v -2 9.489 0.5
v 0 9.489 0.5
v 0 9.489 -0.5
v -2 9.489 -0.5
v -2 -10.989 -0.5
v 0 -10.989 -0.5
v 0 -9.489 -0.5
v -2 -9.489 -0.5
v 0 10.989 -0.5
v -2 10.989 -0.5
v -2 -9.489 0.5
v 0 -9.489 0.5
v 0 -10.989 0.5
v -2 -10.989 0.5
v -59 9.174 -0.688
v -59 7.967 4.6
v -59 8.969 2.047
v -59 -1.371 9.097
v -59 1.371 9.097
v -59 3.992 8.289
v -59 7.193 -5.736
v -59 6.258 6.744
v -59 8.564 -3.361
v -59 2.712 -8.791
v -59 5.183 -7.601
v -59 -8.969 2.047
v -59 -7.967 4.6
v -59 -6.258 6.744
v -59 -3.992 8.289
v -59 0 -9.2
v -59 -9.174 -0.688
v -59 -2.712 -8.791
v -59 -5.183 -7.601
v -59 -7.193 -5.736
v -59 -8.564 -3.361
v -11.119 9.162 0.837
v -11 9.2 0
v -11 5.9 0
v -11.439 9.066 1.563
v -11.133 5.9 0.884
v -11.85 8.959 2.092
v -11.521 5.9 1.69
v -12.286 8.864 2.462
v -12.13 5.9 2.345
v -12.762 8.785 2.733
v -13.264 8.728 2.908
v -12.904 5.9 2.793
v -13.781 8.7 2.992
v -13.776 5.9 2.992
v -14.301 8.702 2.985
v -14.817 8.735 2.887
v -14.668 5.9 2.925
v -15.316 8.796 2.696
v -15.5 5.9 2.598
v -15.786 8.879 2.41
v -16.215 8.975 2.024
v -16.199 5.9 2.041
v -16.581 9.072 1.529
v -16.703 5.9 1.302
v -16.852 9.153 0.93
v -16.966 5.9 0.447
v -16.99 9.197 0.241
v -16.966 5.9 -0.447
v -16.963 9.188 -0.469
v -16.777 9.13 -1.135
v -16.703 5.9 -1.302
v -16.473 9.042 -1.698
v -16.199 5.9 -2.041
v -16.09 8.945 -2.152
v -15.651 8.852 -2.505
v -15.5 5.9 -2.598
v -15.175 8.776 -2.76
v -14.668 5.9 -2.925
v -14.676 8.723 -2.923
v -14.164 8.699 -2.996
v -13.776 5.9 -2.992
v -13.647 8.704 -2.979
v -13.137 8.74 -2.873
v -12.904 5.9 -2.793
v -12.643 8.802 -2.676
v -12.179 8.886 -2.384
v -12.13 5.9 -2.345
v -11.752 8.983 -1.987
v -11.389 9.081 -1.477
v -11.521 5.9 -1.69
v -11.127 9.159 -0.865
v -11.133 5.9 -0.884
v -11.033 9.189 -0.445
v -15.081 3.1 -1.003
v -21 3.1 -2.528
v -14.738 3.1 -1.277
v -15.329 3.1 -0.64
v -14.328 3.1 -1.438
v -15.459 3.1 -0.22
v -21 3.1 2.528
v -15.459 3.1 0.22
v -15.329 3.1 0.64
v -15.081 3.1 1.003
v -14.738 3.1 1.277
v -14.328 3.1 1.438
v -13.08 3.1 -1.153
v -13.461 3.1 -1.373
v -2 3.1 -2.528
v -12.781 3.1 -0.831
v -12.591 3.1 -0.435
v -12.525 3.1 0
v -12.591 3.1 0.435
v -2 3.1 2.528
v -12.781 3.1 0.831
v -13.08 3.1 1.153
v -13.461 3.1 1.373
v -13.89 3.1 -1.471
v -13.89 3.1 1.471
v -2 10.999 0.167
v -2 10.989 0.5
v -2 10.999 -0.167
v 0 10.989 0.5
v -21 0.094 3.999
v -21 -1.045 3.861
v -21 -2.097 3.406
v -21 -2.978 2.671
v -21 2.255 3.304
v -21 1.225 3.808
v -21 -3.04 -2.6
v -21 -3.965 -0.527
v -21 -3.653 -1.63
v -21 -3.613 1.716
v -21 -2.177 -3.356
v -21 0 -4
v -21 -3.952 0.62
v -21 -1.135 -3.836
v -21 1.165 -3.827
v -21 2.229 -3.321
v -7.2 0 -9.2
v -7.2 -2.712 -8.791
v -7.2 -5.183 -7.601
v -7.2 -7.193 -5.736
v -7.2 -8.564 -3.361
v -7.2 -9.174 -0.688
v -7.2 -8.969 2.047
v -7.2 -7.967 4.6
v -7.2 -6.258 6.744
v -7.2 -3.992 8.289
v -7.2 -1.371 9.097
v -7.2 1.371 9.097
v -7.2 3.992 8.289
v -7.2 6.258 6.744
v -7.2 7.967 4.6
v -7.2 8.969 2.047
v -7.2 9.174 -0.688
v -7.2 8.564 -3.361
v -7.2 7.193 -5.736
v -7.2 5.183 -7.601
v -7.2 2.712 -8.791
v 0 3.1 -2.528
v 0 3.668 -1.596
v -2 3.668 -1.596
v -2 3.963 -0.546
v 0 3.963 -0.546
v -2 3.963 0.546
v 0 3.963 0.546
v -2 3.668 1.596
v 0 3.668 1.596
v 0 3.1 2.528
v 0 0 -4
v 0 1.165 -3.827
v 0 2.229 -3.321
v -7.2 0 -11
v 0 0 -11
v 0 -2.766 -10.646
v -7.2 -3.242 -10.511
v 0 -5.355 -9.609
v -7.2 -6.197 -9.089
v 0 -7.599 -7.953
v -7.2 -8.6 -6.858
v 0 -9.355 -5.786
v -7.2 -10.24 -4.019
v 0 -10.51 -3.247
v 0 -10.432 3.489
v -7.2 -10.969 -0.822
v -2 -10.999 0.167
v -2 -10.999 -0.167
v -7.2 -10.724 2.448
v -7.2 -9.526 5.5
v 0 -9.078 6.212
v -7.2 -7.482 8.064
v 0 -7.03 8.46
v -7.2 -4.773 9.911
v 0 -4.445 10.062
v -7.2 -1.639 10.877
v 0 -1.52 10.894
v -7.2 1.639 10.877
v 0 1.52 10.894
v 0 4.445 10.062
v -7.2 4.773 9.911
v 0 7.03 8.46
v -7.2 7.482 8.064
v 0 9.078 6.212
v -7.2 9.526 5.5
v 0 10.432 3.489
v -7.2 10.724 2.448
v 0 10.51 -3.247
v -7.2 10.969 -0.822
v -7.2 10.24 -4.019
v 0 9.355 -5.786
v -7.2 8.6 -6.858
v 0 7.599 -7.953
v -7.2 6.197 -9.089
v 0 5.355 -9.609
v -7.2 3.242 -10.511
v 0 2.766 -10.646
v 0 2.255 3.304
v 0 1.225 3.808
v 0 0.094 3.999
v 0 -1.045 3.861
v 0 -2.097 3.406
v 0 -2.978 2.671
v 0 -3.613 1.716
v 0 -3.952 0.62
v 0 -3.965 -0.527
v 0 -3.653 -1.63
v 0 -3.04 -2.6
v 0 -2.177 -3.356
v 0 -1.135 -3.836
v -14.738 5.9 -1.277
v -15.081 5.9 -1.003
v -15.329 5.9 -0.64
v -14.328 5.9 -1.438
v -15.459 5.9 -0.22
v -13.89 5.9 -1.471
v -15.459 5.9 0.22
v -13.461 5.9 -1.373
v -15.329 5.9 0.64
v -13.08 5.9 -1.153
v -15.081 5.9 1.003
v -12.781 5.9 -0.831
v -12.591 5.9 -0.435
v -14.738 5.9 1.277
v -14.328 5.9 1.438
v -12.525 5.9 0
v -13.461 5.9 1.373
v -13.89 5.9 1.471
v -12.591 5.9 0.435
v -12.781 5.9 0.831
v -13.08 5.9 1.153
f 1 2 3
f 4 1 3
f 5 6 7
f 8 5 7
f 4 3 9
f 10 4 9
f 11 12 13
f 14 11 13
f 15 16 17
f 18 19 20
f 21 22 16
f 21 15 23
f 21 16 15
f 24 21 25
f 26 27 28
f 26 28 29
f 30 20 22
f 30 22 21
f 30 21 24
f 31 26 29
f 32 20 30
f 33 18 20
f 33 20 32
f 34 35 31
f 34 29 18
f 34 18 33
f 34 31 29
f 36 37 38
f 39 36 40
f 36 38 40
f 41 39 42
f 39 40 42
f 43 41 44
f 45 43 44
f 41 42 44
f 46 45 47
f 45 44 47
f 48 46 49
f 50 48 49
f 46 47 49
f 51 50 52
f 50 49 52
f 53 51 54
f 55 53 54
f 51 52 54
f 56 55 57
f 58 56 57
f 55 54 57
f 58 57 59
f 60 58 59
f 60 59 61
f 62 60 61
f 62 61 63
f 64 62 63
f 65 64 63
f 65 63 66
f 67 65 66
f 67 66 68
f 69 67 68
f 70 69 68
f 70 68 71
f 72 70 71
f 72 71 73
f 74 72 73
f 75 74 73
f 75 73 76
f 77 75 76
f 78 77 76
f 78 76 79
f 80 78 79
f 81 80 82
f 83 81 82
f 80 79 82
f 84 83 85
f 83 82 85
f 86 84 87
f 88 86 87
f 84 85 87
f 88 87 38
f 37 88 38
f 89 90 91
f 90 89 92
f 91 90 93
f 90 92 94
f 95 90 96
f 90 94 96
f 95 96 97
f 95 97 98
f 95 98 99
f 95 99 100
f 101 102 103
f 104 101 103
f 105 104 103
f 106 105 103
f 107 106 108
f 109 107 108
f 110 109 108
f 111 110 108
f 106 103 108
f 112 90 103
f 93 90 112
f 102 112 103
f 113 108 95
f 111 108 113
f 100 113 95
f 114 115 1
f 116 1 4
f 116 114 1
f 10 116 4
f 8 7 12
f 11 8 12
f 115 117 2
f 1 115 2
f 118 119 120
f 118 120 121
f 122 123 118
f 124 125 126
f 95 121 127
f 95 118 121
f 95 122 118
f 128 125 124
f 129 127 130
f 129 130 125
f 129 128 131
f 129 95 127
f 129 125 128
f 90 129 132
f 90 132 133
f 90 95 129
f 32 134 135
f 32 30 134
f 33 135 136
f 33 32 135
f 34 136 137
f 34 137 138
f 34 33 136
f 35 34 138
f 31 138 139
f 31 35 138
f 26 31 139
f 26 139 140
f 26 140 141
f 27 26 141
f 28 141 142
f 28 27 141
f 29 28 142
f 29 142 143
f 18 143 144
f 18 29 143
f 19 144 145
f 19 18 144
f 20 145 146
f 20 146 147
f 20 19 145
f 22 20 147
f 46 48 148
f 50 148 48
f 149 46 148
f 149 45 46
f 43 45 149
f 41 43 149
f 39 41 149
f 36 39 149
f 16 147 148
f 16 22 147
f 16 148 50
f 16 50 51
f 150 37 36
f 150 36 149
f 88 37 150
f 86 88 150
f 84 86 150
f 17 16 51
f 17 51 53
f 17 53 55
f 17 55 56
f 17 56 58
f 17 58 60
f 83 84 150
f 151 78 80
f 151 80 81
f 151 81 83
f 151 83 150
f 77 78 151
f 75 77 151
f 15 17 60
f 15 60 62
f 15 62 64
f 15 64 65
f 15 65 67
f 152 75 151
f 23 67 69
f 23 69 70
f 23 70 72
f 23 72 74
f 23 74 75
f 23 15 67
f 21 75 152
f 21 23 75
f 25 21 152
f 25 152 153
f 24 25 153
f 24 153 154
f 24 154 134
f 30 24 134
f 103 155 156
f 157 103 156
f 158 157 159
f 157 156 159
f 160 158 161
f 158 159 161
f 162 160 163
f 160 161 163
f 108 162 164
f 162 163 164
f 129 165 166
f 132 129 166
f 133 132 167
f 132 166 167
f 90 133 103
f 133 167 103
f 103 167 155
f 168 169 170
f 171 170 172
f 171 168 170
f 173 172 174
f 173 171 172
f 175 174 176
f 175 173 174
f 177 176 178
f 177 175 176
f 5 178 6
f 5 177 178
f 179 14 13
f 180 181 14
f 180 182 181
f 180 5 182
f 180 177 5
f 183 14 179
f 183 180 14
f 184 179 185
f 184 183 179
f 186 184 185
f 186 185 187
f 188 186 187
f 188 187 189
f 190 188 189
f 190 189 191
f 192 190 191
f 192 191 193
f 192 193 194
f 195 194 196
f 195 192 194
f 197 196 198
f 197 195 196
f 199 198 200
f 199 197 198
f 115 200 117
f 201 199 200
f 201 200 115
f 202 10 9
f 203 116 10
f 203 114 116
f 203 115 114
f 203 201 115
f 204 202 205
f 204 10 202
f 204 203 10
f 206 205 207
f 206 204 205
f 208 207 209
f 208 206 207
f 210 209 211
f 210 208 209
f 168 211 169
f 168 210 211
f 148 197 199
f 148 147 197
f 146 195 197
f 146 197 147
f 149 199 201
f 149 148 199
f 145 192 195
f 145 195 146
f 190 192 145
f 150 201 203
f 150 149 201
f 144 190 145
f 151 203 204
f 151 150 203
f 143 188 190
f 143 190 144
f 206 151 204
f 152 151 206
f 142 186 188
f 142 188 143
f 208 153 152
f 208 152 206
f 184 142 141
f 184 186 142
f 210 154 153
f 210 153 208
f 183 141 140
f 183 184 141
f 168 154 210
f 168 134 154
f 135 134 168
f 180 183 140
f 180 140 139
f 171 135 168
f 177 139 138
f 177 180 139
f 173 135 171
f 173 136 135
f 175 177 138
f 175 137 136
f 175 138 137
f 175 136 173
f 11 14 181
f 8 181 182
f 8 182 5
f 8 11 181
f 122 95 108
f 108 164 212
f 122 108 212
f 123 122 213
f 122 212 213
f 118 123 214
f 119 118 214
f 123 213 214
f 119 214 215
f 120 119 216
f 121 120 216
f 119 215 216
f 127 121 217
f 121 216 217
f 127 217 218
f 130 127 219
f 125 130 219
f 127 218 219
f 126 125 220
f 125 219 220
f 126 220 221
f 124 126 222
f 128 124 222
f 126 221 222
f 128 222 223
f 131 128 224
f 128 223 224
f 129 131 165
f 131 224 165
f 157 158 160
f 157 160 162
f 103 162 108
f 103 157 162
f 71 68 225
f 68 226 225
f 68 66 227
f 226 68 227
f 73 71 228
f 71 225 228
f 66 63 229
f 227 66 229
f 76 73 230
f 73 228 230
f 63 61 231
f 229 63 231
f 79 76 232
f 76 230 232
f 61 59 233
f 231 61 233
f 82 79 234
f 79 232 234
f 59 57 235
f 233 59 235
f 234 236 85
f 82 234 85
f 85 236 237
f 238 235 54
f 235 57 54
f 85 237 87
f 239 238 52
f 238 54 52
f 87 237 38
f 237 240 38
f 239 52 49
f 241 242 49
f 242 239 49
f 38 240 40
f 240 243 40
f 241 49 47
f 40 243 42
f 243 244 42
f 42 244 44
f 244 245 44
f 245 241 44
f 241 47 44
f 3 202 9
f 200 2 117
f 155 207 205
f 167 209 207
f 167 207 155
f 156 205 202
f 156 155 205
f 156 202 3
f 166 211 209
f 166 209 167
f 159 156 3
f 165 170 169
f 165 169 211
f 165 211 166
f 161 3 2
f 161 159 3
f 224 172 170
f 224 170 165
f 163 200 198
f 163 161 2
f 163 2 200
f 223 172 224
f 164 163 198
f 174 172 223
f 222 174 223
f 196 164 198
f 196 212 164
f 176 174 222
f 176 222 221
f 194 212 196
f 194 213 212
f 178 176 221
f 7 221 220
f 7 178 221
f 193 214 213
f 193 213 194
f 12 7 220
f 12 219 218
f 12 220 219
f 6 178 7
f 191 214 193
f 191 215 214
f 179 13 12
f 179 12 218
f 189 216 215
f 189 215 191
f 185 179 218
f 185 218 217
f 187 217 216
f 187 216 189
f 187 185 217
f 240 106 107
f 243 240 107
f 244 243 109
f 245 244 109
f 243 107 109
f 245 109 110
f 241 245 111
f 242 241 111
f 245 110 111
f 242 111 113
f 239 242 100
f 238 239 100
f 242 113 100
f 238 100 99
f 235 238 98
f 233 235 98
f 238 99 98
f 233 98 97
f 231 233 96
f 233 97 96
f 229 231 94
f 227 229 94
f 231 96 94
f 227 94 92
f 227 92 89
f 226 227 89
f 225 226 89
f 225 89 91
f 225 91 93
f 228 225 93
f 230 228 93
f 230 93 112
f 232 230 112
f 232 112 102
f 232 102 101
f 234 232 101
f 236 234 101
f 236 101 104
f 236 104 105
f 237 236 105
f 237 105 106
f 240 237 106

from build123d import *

# Parameters (mm, degrees)
CUT_EXTRUDE1_DEPTH = 21
CUT_EXTRUDE2_DEPTH = 2
SKETCH3_R          = 1.475
CUT_EXTRUDE3_DEPTH = 62.650709647
CUT_EXTRUDE4_START = -2.8
SKETCH3_4_R        = 3
SKETCH3_4_R_2      = 1.475
CUT_EXTRUDE4_DEPTH = 59.850709743
CUT_EXTRUDE5_START = -2
CUT_EXTRUDE5_DEPTH = 2


with BuildPart() as part:
    # Sketch1 → Revolve1 (revolve)
    with BuildSketch(Plane(origin=(0, 0, 0), x_dir=(1, 0, 0), z_dir=(0, 1, 0))):
        Polygon((0, 0), (0, 11), (-7.2, 11), (-7.2, 9.2), (-59, 9.2), (-59, 0), align=None)
    revolve(axis=Axis((0, 0, 0), (-1, 0, 0)))

    # Sketch2 → Cut-Extrude1 (cut)
    with BuildSketch(Plane(origin=(0, 0, 0), x_dir=(0, 0, -1), z_dir=(1, 0, 0))):
        with BuildLine():
            Line((2.527844932, 3.1), (-2.527844932, 3.1))
            ThreePointArc((-2.527844932, 3.1), (-1.715899221, -3.613265817), (4, 0))
            ThreePointArc((4, 0), (3.613265817, 1.715899221), (2.527844932, 3.1))
        make_face()
    extrude(amount=-CUT_EXTRUDE1_DEPTH, mode=Mode.SUBTRACT)

    # Sketch2<4> → Cut-Extrude2 (cut)
    with BuildSketch(Plane(origin=(0, 0, 0), x_dir=(0, 0, -1), z_dir=(1, 0, 0))):
        with BuildLine():
            ThreePointArc((2.527844932, 3.1), (0, 4), (-2.527844932, 3.1))
            Line((-2.527844932, 3.1), (2.527844932, 3.1))
        make_face()
    extrude(amount=-CUT_EXTRUDE2_DEPTH, mode=Mode.SUBTRACT)

    # Sketch3 → Cut-Extrude3 (cut, through all)
    with BuildSketch(Plane.XZ.offset(-3.1)):
        with Locations((-14, 0)):
            Circle(SKETCH3_R)
    extrude(amount=-CUT_EXTRUDE3_DEPTH, mode=Mode.SUBTRACT)

    # Sketch3<4> → Cut-Extrude4 (cut, through all)
    with BuildSketch(Plane.XZ.offset(-3.1).offset(CUT_EXTRUDE4_START)):
        with Locations((-14, 0)):
            Circle(SKETCH3_4_R)
        with Locations((-14, 0)):
            Circle(SKETCH3_4_R_2, mode=Mode.SUBTRACT)
    extrude(amount=-CUT_EXTRUDE4_DEPTH, mode=Mode.SUBTRACT)

    # Sketch2<6> → Cut-Extrude5 (cut)
    with BuildSketch(Plane(origin=(0, 0, 0), x_dir=(0, 0, -1), z_dir=(1, 0, 0)).offset(CUT_EXTRUDE5_START)):
        with BuildLine():
            Line((0.5, 9.488630488), (0.5, 10.988630488))
            ThreePointArc((0.5, 10.988630488), (0, 11), (-0.5, 10.988630488))
            Line((-0.5, 10.988630488), (-0.5, 9.488630488))
            Line((-0.5, 9.488630488), (0.5, 9.488630488))
        make_face()
        with BuildLine():
            ThreePointArc((-0.5, -10.988630488), (0, -11), (0.5, -10.988630488))
            Line((0.5, -10.988630488), (0.5, -9.488630488))
            Line((0.5, -9.488630488), (-0.5, -9.488630488))
            Line((-0.5, -9.488630488), (-0.5, -10.988630488))
        make_face()
    extrude(amount=CUT_EXTRUDE5_DEPTH, mode=Mode.SUBTRACT)


solid = part.part
